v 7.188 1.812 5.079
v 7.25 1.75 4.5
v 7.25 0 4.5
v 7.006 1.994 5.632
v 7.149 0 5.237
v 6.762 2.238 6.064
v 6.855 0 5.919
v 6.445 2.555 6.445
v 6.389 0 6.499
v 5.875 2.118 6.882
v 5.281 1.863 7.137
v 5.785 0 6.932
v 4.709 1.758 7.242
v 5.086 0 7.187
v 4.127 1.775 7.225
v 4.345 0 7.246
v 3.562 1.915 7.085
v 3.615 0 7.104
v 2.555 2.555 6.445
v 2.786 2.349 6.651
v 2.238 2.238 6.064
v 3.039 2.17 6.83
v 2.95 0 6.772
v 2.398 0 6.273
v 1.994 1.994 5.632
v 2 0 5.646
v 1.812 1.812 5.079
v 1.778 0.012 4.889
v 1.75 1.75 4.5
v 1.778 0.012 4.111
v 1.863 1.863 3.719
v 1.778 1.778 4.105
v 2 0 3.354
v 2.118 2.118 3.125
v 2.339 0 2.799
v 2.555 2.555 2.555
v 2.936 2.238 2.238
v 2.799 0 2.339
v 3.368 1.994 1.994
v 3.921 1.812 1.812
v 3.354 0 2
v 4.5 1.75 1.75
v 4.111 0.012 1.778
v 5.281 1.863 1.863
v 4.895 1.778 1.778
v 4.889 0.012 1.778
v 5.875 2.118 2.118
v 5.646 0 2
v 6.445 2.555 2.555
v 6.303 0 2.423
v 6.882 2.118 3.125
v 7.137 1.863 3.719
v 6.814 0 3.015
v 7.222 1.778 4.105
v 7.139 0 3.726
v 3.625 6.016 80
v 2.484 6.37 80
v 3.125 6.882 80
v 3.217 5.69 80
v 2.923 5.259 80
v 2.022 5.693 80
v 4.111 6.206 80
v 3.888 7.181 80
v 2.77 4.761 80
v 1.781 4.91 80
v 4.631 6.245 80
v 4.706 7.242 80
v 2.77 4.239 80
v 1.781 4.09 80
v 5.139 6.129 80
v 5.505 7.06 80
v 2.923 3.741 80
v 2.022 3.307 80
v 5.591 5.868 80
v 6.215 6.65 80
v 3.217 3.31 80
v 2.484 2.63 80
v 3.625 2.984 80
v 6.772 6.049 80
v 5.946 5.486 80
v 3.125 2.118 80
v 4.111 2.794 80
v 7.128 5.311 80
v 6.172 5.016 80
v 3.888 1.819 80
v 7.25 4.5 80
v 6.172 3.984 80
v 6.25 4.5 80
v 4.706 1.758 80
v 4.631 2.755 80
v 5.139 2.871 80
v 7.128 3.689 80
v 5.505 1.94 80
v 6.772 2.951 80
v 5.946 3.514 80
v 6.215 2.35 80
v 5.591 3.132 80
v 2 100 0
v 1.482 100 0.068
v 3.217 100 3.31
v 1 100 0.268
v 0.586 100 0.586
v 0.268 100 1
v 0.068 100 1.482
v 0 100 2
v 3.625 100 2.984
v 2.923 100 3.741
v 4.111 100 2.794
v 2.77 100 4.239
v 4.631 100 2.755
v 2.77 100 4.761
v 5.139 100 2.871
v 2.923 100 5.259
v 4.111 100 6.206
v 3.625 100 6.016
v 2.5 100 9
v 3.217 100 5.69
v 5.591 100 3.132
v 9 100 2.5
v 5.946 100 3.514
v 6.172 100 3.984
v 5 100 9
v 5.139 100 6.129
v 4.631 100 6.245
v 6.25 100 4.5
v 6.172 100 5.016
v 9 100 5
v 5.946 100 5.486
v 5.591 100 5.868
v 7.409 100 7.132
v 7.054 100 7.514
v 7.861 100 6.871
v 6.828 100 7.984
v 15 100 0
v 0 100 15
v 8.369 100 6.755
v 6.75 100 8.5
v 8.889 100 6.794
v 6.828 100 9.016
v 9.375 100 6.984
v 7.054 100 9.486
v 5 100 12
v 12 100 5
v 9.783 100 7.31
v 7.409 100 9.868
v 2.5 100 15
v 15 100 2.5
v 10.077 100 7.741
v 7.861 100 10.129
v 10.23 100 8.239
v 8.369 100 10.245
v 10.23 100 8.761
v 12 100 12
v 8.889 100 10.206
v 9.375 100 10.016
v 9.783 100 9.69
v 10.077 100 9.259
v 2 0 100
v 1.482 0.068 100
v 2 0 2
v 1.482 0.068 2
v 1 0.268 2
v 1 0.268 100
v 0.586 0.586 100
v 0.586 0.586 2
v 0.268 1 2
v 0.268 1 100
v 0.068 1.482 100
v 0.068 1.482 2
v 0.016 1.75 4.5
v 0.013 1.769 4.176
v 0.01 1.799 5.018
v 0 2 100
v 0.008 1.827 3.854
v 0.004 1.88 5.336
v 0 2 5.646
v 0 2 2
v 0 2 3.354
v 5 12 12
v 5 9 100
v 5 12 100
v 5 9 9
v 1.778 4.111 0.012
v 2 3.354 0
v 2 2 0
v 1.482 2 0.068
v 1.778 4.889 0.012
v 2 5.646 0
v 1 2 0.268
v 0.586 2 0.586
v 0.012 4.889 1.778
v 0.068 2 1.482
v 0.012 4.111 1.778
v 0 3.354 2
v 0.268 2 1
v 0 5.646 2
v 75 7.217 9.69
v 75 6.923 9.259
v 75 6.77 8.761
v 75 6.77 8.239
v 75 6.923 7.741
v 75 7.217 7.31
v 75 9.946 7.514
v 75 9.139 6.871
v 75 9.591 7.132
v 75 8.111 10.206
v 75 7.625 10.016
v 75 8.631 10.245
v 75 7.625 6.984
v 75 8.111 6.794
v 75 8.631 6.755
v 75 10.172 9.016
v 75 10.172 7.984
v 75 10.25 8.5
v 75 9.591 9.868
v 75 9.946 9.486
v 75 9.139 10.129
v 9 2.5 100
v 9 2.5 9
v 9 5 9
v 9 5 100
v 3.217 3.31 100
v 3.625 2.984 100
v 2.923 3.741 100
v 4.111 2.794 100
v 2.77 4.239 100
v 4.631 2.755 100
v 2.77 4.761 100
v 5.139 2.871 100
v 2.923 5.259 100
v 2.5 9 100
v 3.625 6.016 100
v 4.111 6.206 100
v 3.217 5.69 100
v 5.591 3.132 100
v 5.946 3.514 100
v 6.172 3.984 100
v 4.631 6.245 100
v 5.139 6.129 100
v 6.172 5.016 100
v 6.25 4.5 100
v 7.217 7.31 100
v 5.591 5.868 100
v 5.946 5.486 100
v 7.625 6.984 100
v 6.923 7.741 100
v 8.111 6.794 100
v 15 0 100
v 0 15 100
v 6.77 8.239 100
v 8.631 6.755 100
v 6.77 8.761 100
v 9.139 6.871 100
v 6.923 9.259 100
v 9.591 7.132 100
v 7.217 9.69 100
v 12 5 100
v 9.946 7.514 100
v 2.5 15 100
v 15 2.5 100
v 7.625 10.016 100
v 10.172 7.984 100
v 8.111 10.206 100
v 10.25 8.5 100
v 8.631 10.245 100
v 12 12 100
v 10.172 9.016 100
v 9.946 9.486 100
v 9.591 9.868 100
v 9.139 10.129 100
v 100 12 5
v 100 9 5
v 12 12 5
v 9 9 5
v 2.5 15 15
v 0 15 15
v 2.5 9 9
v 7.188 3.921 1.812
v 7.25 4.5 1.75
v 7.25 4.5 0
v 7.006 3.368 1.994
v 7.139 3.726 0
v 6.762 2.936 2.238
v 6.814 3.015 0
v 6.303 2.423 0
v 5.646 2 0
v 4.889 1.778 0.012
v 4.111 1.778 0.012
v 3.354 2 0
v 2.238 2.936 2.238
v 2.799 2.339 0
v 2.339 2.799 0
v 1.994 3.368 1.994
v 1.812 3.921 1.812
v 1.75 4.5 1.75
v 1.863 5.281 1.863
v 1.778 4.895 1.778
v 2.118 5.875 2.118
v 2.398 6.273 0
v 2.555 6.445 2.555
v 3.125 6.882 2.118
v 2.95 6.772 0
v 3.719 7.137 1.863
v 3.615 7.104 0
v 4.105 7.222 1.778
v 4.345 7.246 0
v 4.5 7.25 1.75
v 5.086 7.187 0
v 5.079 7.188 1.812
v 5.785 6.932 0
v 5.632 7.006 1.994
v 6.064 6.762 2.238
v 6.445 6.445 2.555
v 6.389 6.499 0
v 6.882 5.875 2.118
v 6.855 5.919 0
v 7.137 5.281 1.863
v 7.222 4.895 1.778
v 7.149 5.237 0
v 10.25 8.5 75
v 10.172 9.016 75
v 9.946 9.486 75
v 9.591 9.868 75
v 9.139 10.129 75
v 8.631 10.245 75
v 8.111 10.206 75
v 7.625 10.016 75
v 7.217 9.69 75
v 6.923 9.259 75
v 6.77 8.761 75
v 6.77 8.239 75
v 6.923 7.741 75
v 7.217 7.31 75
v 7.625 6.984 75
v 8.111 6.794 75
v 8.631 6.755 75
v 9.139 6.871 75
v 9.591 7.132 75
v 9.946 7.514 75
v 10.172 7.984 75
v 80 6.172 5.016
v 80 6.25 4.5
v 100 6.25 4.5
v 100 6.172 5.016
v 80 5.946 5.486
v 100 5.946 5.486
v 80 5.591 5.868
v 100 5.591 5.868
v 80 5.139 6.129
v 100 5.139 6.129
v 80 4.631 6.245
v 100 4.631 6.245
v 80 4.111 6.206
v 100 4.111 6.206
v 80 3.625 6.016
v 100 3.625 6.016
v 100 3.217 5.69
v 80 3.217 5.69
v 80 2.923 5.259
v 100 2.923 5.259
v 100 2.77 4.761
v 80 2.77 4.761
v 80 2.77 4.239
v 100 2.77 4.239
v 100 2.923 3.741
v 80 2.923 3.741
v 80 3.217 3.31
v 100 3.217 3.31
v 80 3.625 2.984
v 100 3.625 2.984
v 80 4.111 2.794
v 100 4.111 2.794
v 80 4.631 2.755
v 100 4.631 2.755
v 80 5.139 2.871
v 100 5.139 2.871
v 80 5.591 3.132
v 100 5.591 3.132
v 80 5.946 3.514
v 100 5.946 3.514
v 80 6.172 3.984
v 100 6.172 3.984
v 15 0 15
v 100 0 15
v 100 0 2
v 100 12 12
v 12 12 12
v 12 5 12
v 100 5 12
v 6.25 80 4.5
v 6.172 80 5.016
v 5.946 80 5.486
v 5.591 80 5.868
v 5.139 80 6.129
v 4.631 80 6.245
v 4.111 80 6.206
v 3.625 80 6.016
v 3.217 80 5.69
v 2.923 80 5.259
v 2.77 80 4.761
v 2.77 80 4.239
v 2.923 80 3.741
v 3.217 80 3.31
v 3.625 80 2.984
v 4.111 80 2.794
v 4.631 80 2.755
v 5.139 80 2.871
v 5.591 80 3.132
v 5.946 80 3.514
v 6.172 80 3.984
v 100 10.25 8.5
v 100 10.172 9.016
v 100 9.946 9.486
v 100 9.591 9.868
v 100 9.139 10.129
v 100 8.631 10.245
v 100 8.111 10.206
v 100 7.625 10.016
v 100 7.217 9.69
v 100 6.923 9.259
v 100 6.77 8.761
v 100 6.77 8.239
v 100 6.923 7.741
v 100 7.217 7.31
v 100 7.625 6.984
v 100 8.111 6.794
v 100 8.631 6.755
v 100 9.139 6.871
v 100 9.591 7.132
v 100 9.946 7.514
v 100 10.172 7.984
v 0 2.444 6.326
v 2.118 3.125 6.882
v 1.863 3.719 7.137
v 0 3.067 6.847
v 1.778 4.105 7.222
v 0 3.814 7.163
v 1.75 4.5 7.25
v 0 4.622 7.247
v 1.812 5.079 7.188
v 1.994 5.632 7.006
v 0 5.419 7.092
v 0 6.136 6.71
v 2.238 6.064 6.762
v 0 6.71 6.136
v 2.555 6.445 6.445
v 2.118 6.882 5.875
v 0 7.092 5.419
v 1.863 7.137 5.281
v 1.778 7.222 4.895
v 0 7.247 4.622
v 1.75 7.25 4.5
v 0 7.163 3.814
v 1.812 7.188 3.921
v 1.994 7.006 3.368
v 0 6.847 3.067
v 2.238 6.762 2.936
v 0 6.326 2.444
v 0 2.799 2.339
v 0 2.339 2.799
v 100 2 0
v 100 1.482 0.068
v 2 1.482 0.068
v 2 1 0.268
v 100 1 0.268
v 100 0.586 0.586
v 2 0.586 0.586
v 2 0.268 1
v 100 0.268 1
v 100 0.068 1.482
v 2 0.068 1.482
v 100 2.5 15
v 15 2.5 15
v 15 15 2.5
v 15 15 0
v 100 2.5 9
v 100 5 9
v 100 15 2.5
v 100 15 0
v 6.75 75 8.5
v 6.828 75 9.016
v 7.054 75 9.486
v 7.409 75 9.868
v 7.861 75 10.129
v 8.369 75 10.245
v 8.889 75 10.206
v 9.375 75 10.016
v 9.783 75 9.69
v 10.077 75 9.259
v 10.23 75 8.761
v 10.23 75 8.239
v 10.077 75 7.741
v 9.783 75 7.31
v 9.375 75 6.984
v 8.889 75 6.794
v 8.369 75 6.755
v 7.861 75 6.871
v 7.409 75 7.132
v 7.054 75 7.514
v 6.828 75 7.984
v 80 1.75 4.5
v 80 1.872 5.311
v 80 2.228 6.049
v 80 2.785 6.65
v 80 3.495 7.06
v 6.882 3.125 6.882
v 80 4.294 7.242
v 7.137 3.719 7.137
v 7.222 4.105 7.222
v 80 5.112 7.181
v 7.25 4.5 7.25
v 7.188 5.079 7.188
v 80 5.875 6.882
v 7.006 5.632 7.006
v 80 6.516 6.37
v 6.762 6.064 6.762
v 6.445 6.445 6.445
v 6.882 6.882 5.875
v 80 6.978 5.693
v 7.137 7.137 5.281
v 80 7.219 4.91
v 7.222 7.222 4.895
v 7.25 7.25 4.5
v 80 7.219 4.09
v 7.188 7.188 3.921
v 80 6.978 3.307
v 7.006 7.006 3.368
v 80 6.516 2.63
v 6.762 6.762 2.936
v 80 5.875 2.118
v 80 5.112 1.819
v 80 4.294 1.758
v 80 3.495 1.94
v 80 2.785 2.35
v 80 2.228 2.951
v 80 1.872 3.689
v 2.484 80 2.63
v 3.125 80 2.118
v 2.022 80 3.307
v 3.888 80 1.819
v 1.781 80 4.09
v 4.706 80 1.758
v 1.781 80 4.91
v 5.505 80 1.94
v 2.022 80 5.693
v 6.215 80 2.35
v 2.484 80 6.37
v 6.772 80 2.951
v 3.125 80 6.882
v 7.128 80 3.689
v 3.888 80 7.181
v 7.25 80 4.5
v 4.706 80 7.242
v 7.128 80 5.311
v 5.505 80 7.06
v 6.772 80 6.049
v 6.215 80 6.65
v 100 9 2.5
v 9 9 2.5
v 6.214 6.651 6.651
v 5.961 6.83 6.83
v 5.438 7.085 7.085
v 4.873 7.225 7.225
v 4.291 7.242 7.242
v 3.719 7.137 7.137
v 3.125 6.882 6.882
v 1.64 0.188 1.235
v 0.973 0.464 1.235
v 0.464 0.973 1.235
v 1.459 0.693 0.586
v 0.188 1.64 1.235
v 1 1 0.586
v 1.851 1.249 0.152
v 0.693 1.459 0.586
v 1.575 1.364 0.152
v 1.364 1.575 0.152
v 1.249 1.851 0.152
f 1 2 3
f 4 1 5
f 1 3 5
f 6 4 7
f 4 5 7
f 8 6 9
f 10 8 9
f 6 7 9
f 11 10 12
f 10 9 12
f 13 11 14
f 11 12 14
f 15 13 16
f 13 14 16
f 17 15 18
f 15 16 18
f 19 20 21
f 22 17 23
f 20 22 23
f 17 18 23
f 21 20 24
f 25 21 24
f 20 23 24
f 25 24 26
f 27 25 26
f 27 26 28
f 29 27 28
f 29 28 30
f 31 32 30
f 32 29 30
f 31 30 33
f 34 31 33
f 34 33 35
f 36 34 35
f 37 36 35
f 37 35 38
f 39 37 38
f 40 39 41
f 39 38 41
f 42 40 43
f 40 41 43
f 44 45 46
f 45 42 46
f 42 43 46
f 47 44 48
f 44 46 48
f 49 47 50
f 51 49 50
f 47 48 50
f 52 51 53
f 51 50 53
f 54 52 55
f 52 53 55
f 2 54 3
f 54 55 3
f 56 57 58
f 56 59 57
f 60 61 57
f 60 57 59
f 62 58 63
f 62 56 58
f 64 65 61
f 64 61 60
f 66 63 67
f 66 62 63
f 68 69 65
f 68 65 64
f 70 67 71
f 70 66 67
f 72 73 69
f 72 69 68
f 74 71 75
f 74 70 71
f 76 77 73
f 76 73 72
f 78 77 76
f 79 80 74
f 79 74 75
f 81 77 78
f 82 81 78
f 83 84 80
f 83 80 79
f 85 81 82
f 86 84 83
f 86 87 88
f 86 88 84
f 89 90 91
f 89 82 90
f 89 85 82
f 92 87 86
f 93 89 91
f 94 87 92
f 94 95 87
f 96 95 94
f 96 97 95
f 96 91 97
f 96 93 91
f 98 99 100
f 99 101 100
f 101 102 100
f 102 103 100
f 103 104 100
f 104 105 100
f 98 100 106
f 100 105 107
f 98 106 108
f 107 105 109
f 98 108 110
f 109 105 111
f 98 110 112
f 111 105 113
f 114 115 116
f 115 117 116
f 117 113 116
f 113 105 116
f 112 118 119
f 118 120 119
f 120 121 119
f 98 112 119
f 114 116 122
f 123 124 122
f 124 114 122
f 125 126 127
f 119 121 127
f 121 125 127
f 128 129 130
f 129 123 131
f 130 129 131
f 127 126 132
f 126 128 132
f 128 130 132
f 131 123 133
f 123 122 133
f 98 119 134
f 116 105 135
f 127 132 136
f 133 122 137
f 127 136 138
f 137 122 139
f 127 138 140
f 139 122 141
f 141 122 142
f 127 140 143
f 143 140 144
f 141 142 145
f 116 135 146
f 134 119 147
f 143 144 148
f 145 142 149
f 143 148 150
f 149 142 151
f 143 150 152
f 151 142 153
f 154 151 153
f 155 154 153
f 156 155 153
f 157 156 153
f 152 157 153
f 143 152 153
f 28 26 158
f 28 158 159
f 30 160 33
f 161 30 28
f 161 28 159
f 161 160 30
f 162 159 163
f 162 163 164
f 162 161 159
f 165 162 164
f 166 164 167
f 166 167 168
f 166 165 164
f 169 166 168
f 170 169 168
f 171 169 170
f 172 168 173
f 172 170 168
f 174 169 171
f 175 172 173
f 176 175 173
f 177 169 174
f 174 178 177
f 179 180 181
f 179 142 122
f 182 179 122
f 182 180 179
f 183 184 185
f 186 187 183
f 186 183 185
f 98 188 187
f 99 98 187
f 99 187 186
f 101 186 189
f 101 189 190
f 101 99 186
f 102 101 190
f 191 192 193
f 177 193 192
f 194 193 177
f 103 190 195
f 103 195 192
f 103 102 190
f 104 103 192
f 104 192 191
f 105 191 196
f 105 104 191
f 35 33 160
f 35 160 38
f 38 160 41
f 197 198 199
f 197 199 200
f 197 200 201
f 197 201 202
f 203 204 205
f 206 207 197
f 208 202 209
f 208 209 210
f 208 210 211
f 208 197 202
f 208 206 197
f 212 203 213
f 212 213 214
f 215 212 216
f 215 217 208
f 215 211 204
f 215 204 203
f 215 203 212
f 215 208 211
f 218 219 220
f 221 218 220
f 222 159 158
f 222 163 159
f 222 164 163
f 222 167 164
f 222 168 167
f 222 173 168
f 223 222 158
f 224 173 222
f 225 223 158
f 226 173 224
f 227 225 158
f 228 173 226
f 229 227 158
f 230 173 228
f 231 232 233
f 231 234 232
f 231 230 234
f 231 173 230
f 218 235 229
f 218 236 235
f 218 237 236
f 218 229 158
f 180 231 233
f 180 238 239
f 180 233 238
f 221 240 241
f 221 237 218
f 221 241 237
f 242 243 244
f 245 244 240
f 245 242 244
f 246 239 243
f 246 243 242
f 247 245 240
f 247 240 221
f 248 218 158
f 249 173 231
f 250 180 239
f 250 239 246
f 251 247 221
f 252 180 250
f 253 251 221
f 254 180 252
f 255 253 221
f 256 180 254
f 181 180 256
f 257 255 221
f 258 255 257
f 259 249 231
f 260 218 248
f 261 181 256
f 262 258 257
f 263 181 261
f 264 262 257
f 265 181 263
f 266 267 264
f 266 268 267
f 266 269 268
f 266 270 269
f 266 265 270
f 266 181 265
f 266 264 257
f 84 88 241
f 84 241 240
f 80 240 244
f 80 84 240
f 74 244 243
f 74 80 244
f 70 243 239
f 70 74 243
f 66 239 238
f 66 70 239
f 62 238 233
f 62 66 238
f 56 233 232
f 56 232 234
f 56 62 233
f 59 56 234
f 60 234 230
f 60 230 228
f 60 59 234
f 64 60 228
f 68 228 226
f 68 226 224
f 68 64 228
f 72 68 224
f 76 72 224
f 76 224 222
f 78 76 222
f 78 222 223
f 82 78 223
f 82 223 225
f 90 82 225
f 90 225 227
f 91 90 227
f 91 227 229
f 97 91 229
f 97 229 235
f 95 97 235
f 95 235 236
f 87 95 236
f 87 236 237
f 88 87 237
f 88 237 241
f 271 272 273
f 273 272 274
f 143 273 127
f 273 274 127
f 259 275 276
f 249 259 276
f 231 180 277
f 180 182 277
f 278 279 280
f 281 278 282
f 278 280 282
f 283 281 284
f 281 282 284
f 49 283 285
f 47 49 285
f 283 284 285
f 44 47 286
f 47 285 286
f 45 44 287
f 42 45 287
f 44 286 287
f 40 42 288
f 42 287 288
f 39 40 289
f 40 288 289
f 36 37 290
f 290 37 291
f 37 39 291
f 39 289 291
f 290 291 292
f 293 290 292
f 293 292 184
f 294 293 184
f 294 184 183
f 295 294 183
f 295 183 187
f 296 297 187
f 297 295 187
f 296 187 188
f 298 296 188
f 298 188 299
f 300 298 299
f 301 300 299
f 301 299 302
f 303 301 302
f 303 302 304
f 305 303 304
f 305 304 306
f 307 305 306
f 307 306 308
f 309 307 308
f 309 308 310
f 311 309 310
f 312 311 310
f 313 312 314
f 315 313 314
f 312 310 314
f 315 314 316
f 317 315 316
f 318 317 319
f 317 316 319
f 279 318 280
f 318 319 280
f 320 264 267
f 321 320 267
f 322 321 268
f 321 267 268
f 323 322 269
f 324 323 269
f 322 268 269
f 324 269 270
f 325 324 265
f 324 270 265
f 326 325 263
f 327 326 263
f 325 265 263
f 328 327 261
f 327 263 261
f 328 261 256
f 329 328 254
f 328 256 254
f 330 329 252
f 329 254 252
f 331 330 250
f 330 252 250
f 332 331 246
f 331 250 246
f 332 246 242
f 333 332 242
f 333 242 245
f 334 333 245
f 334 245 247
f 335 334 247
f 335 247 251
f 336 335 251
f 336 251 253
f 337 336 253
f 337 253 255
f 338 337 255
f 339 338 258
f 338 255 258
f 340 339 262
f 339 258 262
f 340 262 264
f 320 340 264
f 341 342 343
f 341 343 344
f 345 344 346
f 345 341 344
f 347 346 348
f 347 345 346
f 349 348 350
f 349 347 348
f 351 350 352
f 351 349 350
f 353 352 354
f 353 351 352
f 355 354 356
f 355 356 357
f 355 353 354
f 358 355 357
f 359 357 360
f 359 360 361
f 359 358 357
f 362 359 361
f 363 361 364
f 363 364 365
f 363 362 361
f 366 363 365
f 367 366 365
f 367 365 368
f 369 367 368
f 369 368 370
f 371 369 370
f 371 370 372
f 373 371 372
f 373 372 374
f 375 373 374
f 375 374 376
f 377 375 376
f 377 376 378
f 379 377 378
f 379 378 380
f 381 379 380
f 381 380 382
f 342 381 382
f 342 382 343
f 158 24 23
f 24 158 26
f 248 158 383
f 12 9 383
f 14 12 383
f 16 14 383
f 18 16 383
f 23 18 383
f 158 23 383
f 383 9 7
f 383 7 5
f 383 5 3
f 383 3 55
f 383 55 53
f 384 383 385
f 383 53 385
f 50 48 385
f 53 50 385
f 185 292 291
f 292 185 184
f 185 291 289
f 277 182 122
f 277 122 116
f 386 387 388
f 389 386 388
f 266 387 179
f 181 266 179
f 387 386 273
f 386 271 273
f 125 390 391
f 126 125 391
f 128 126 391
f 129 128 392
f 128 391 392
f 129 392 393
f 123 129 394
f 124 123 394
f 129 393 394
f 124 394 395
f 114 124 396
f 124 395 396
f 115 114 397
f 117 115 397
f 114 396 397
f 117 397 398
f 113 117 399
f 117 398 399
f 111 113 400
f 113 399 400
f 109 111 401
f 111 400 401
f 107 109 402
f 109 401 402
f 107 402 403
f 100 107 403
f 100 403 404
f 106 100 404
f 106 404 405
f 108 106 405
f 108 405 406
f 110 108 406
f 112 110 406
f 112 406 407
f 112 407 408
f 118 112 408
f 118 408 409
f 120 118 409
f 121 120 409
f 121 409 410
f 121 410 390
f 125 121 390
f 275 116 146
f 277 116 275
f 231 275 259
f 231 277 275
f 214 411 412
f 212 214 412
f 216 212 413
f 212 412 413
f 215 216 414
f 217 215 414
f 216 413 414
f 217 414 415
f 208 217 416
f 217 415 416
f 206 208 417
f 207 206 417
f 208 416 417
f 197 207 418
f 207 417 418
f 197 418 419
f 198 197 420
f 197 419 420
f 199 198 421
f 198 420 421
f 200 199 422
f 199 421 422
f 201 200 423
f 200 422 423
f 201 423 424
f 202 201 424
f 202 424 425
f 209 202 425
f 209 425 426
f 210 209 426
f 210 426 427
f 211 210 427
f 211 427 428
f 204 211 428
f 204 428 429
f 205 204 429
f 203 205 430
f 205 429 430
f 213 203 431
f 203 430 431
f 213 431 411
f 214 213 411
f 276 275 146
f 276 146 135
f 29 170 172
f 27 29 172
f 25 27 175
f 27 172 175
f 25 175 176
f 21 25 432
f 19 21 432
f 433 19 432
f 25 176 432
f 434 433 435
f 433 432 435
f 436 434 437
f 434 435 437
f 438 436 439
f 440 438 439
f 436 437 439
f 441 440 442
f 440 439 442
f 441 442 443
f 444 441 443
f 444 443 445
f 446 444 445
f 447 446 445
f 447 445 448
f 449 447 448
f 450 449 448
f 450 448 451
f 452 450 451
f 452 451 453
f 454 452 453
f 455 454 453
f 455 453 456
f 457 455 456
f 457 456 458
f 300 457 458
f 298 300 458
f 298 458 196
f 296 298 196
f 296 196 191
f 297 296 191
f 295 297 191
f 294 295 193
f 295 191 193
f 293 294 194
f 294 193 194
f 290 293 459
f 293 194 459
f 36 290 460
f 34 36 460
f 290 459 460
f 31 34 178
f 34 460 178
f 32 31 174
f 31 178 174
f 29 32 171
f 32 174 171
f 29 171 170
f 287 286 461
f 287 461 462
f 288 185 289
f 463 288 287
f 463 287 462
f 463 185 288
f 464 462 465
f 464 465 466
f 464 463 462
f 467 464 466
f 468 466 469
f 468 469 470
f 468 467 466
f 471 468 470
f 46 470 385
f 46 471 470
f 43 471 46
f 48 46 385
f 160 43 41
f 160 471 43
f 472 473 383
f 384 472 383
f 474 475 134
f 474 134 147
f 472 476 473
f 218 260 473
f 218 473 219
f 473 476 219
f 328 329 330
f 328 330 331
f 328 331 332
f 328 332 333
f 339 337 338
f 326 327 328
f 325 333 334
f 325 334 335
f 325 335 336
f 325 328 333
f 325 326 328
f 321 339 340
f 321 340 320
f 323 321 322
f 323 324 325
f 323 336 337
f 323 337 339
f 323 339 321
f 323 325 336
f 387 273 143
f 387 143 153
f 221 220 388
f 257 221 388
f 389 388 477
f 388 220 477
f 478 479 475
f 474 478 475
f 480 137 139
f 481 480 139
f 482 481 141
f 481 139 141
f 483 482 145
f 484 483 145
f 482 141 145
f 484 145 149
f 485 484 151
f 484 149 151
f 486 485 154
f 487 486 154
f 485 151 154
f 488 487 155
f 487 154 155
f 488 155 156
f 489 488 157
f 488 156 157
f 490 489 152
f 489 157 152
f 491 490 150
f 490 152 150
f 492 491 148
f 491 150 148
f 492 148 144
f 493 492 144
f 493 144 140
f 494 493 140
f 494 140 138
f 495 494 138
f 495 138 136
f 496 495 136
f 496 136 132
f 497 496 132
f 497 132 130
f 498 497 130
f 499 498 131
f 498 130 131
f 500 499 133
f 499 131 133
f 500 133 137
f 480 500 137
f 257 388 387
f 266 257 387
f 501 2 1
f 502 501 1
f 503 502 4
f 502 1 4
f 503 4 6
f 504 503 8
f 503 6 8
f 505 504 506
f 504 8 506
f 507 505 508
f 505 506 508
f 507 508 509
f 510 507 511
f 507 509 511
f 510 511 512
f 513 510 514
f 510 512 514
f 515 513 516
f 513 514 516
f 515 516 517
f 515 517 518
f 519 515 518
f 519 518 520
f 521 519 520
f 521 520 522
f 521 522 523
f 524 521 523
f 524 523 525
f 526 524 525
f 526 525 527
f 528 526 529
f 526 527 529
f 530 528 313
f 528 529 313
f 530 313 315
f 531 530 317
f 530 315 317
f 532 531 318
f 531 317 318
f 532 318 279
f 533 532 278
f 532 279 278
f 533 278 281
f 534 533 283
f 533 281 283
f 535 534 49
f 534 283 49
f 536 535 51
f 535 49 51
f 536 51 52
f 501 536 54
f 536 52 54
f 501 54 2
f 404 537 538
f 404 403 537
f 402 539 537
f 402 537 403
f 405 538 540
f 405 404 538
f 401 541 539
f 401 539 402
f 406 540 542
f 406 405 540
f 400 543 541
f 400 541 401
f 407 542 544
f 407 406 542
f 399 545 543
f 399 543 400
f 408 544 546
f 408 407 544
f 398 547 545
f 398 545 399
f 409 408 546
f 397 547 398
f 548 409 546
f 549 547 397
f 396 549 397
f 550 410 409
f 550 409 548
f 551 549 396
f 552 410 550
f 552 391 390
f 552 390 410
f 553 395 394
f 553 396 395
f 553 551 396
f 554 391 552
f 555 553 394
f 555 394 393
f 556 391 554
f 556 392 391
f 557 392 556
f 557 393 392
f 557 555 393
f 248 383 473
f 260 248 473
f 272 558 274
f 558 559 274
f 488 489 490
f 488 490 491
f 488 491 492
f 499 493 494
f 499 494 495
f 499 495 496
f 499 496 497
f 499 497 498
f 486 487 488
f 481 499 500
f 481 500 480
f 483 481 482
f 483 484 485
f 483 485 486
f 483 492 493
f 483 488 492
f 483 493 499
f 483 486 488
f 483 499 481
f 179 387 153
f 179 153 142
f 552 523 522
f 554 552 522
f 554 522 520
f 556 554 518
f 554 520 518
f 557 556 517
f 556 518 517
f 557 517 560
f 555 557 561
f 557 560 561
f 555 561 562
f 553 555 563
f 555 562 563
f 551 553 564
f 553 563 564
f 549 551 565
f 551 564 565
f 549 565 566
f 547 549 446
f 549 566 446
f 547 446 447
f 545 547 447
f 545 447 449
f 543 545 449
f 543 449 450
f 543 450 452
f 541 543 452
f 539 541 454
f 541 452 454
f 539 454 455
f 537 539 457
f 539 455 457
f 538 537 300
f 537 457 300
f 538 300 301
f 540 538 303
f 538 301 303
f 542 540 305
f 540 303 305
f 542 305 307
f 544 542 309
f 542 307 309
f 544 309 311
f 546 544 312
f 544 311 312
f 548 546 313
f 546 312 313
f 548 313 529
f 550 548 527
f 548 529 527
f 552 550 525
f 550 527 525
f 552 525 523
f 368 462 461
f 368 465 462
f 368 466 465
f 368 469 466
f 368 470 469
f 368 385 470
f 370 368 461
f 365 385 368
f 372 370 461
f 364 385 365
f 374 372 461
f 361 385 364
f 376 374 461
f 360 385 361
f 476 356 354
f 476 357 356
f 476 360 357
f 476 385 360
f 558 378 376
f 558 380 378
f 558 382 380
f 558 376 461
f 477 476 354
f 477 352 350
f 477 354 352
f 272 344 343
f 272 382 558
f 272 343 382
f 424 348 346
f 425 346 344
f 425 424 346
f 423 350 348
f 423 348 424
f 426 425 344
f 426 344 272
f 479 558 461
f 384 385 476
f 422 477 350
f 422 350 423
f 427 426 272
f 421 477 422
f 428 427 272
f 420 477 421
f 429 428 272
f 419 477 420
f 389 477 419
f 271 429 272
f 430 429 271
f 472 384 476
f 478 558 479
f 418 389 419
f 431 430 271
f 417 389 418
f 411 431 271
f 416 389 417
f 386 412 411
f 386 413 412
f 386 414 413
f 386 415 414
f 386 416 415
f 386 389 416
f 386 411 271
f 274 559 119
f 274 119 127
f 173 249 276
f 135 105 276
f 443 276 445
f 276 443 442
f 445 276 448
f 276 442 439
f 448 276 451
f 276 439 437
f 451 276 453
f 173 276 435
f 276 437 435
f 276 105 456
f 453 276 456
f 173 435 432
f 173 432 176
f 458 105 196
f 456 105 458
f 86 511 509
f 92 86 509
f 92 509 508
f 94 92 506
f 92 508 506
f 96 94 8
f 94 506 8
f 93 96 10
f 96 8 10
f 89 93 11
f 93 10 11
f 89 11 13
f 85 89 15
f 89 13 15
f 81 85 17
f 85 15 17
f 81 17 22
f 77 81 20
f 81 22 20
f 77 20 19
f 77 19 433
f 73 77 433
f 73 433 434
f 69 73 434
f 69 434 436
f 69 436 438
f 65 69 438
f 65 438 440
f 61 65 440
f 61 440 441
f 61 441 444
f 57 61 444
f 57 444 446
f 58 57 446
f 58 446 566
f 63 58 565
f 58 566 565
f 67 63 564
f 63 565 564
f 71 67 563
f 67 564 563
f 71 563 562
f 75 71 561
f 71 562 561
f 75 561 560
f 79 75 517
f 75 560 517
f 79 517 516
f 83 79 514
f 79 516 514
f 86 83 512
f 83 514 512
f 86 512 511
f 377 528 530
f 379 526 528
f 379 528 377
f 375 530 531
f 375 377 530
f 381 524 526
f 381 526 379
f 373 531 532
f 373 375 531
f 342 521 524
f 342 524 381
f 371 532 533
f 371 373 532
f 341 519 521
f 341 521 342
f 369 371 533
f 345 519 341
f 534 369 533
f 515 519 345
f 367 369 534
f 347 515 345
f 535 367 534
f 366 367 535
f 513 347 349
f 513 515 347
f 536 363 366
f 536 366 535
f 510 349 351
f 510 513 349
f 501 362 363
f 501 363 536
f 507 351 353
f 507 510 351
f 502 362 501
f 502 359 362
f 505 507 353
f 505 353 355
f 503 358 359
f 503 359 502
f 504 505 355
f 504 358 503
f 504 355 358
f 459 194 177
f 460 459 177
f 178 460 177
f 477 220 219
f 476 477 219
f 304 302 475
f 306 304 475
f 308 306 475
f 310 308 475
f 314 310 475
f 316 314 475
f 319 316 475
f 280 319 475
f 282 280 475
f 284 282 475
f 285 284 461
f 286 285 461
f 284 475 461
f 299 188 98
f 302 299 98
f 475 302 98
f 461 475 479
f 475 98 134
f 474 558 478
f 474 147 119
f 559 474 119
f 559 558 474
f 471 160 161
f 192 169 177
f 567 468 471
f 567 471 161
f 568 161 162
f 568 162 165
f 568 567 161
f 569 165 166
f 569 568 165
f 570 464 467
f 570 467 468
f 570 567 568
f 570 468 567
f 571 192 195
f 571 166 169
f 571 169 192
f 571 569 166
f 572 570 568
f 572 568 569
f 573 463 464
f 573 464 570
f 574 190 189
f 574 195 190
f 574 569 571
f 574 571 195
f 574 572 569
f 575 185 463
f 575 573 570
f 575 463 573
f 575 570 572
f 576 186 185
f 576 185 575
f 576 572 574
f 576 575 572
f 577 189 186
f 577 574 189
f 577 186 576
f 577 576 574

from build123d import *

# Parameters (mm, degrees)
F0_R          = 1.75
F1_DEPTH      = 100
F2_R          = 1.75
F3_DEPTH      = 100
F4_R          = 1.75
F5_DEPTH      = 100
F6_DEPTH      = 3
F7_DEPTH      = 3
F8_DEPTH      = 3
F9_R          = 2.75
F10_DEPTH     = 80
F11_R         = 2.75
F12_DEPTH     = 80
F13_R         = 2.75
F14_DEPTH     = 80
F15_T1_DEPTH  = 103
F15_T3_DEPTH  = 103
F15_T5_DEPTH  = 103
F15_S9_W      = 2
F15_S9_H      = 2
F15_T10_DEPTH = 2
F16_R         = 1.75
F17_DEPTH     = 25
F18_R         = 1.75
F19_DEPTH     = 25
F20_R         = 1.75
F21_DEPTH     = 25


# Not quite as in the source:
# - a fillet or chamfer that OpenCascade refuses, or shapes differently, is made with other operations: its cross-section is extruded or revolved along the edge and cut away or added


with BuildPart() as f1:
    # F0 (on Top) → F1 (new body)
    with BuildSketch(Plane.XY):
        Polygon((2.5, 15), (0, 15), (0, 0), (15, 0), (15, 2.5), (9, 2.5), (9, 5), (12, 5), (12, 12), (5, 12), (5, 9), (2.5, 9), align=None)
        with Locations((4.5, 4.5)):
            Circle(F0_R, mode=Mode.SUBTRACT)
    extrude(amount=F1_DEPTH)

    # F2 (on Right) → F3 (join)
    with BuildSketch(Plane.YZ):
        Polygon((2.5, 15), (0, 15), (0, 0), (15, 0), (15, 2.5), (9, 2.5), (9, 5), (12, 5), (12, 12), (5, 12), (5, 9), (2.5, 9), align=None)
        with Locations((4.5, 4.5)):
            Circle(F2_R, mode=Mode.SUBTRACT)
    extrude(amount=F3_DEPTH)

    # F4 (on Front) → F5 (join)
    with BuildSketch(Plane.XZ):
        Polygon((2.5, 15), (0, 15), (0, 0), (15, 0), (15, 2.5), (9, 2.5), (9, 5), (12, 5), (12, 12), (5, 12), (5, 9), (2.5, 9), align=None)
        with Locations((4.5, 4.5)):
            Circle(F4_R, mode=Mode.SUBTRACT)
    extrude(amount=-F5_DEPTH)

    # F6 (cut): a face of the model
    f6_faces = [f1.faces().sort_by_distance(p)[0] for p in [
        (3.75, 12, 10.5),
    ]]
    extrude(f6_faces, amount=-F6_DEPTH, mode=Mode.SUBTRACT)

    # F7 (cut): a face of the model
    f7_faces = [f1.faces().sort_by_distance(p)[0] for p in [
        (12, 3.75, 10.5),
    ]]
    extrude(f7_faces, amount=-F7_DEPTH, mode=Mode.SUBTRACT)

    # F8 (cut): a face of the model
    f8_faces = [f1.faces().sort_by_distance(p)[0] for p in [
        (12, 10.5, 3.75),
    ]]
    extrude(f8_faces, amount=-F8_DEPTH, mode=Mode.SUBTRACT)

    # F9 (on face) → F10 (cut)
    with BuildSketch(Plane(origin=(0, 0, 0), x_dir=(0, -1, 0), z_dir=(-1, 0, 0))):
        with Locations((-4.5, 4.5)):
            Circle(F9_R)
    extrude(amount=-F10_DEPTH, mode=Mode.SUBTRACT)

    # F11 (on face) → F12 (cut)
    with BuildSketch(Plane(origin=(0, 0, 0), x_dir=(1, 0, 0), z_dir=(0, 0, -1))):
        with Locations((4.5, -4.5)):
            Circle(F11_R)
    extrude(amount=-F12_DEPTH, mode=Mode.SUBTRACT)

    # F13 (on face) → F14 (cut)
    with BuildSketch(Plane.XZ):
        with Locations((4.5, 4.5)):
            Circle(F13_R)
    extrude(amount=-F14_DEPTH, mode=Mode.SUBTRACT)

    # F15: fillet of radius 2 on 3 edges, made by hand

    # F15_s2 → F15_t1 (cut)
    with BuildSketch(Plane.XZ.offset(-105)):
        with BuildLine():
            ThreePointArc((2, 0), (0.5857864376, 0.5857864376), (0, 2))
            Line((0, 2), (0, 0))
            Line((0, 0), (2, 0))
        make_face()
    extrude(amount=F15_T1_DEPTH, mode=Mode.SUBTRACT)

    # F15_s4 → F15_t3 (cut)
    with BuildSketch(Plane.YZ.offset(2)):
        with BuildLine():
            ThreePointArc((2, 0), (0.5857864376, 0.5857864376), (0, 2))
            Line((0, 2), (0, 0))
            Line((0, 0), (2, 0))
        make_face()
    extrude(amount=F15_T3_DEPTH, mode=Mode.SUBTRACT)

    # F15_s6 → F15_t5 (cut)
    with BuildSketch(Plane.XY.offset(2)):
        with BuildLine():
            ThreePointArc((2, 0), (0.5857864376, 0.5857864376), (0, 2))
            Line((0, 2), (0, 0))
            Line((0, 0), (2, 0))
        make_face()
    extrude(amount=F15_T5_DEPTH, mode=Mode.SUBTRACT)


with BuildPart() as f15_tool8:
    # F15_s9 → F15_t10 (new body)
    with BuildSketch(Plane.XY.offset(2)):
        with Locations((1, 1)):
            Rectangle(F15_S9_W, F15_S9_H)
    extrude(amount=-F15_T10_DEPTH)

    # F15_s11 → F15_t12 (revolve, cut)
    with BuildSketch(Plane(origin=(2, 2, 2), x_dir=(0.7071067812, 0.7071067812, 0), z_dir=(-0.7071067812, 0.7071067812, 0))):
        with BuildLine():
            ThreePointArc((0, -2), (2, 0), (0, 2))
            Line((0, 2), (0, -2))
        make_face()
    revolve(axis=Axis((2, 2, 2), (0, 0, -1)), mode=Mode.SUBTRACT)


with BuildPart() as f1_1:
    add(f1.part)

    # F15_t7: cut F15_tool8
    add(f15_tool8.part, mode=Mode.SUBTRACT)

    # F16 (on face) → F17 (cut)
    with BuildSketch(Plane.YZ.offset(100)):
        with Locations((8.5, 8.5)):
            Circle(F16_R)
    extrude(amount=-F17_DEPTH, mode=Mode.SUBTRACT)

    # F18 (on face) → F19 (cut)
    with BuildSketch(Plane.XY.offset(100)):
        with Locations((8.5, 8.5)):
            Circle(F18_R)
    extrude(amount=-F19_DEPTH, mode=Mode.SUBTRACT)

    # F20 (on face) → F21 (cut)
    with BuildSketch(Plane(origin=(0, 100, 0), x_dir=(-1, 0, 0), z_dir=(0, 1, 0))):
        with Locations((-8.5, 8.5)):
            Circle(F20_R)
    extrude(amount=-F21_DEPTH, mode=Mode.SUBTRACT)


solid = f1_1.part
